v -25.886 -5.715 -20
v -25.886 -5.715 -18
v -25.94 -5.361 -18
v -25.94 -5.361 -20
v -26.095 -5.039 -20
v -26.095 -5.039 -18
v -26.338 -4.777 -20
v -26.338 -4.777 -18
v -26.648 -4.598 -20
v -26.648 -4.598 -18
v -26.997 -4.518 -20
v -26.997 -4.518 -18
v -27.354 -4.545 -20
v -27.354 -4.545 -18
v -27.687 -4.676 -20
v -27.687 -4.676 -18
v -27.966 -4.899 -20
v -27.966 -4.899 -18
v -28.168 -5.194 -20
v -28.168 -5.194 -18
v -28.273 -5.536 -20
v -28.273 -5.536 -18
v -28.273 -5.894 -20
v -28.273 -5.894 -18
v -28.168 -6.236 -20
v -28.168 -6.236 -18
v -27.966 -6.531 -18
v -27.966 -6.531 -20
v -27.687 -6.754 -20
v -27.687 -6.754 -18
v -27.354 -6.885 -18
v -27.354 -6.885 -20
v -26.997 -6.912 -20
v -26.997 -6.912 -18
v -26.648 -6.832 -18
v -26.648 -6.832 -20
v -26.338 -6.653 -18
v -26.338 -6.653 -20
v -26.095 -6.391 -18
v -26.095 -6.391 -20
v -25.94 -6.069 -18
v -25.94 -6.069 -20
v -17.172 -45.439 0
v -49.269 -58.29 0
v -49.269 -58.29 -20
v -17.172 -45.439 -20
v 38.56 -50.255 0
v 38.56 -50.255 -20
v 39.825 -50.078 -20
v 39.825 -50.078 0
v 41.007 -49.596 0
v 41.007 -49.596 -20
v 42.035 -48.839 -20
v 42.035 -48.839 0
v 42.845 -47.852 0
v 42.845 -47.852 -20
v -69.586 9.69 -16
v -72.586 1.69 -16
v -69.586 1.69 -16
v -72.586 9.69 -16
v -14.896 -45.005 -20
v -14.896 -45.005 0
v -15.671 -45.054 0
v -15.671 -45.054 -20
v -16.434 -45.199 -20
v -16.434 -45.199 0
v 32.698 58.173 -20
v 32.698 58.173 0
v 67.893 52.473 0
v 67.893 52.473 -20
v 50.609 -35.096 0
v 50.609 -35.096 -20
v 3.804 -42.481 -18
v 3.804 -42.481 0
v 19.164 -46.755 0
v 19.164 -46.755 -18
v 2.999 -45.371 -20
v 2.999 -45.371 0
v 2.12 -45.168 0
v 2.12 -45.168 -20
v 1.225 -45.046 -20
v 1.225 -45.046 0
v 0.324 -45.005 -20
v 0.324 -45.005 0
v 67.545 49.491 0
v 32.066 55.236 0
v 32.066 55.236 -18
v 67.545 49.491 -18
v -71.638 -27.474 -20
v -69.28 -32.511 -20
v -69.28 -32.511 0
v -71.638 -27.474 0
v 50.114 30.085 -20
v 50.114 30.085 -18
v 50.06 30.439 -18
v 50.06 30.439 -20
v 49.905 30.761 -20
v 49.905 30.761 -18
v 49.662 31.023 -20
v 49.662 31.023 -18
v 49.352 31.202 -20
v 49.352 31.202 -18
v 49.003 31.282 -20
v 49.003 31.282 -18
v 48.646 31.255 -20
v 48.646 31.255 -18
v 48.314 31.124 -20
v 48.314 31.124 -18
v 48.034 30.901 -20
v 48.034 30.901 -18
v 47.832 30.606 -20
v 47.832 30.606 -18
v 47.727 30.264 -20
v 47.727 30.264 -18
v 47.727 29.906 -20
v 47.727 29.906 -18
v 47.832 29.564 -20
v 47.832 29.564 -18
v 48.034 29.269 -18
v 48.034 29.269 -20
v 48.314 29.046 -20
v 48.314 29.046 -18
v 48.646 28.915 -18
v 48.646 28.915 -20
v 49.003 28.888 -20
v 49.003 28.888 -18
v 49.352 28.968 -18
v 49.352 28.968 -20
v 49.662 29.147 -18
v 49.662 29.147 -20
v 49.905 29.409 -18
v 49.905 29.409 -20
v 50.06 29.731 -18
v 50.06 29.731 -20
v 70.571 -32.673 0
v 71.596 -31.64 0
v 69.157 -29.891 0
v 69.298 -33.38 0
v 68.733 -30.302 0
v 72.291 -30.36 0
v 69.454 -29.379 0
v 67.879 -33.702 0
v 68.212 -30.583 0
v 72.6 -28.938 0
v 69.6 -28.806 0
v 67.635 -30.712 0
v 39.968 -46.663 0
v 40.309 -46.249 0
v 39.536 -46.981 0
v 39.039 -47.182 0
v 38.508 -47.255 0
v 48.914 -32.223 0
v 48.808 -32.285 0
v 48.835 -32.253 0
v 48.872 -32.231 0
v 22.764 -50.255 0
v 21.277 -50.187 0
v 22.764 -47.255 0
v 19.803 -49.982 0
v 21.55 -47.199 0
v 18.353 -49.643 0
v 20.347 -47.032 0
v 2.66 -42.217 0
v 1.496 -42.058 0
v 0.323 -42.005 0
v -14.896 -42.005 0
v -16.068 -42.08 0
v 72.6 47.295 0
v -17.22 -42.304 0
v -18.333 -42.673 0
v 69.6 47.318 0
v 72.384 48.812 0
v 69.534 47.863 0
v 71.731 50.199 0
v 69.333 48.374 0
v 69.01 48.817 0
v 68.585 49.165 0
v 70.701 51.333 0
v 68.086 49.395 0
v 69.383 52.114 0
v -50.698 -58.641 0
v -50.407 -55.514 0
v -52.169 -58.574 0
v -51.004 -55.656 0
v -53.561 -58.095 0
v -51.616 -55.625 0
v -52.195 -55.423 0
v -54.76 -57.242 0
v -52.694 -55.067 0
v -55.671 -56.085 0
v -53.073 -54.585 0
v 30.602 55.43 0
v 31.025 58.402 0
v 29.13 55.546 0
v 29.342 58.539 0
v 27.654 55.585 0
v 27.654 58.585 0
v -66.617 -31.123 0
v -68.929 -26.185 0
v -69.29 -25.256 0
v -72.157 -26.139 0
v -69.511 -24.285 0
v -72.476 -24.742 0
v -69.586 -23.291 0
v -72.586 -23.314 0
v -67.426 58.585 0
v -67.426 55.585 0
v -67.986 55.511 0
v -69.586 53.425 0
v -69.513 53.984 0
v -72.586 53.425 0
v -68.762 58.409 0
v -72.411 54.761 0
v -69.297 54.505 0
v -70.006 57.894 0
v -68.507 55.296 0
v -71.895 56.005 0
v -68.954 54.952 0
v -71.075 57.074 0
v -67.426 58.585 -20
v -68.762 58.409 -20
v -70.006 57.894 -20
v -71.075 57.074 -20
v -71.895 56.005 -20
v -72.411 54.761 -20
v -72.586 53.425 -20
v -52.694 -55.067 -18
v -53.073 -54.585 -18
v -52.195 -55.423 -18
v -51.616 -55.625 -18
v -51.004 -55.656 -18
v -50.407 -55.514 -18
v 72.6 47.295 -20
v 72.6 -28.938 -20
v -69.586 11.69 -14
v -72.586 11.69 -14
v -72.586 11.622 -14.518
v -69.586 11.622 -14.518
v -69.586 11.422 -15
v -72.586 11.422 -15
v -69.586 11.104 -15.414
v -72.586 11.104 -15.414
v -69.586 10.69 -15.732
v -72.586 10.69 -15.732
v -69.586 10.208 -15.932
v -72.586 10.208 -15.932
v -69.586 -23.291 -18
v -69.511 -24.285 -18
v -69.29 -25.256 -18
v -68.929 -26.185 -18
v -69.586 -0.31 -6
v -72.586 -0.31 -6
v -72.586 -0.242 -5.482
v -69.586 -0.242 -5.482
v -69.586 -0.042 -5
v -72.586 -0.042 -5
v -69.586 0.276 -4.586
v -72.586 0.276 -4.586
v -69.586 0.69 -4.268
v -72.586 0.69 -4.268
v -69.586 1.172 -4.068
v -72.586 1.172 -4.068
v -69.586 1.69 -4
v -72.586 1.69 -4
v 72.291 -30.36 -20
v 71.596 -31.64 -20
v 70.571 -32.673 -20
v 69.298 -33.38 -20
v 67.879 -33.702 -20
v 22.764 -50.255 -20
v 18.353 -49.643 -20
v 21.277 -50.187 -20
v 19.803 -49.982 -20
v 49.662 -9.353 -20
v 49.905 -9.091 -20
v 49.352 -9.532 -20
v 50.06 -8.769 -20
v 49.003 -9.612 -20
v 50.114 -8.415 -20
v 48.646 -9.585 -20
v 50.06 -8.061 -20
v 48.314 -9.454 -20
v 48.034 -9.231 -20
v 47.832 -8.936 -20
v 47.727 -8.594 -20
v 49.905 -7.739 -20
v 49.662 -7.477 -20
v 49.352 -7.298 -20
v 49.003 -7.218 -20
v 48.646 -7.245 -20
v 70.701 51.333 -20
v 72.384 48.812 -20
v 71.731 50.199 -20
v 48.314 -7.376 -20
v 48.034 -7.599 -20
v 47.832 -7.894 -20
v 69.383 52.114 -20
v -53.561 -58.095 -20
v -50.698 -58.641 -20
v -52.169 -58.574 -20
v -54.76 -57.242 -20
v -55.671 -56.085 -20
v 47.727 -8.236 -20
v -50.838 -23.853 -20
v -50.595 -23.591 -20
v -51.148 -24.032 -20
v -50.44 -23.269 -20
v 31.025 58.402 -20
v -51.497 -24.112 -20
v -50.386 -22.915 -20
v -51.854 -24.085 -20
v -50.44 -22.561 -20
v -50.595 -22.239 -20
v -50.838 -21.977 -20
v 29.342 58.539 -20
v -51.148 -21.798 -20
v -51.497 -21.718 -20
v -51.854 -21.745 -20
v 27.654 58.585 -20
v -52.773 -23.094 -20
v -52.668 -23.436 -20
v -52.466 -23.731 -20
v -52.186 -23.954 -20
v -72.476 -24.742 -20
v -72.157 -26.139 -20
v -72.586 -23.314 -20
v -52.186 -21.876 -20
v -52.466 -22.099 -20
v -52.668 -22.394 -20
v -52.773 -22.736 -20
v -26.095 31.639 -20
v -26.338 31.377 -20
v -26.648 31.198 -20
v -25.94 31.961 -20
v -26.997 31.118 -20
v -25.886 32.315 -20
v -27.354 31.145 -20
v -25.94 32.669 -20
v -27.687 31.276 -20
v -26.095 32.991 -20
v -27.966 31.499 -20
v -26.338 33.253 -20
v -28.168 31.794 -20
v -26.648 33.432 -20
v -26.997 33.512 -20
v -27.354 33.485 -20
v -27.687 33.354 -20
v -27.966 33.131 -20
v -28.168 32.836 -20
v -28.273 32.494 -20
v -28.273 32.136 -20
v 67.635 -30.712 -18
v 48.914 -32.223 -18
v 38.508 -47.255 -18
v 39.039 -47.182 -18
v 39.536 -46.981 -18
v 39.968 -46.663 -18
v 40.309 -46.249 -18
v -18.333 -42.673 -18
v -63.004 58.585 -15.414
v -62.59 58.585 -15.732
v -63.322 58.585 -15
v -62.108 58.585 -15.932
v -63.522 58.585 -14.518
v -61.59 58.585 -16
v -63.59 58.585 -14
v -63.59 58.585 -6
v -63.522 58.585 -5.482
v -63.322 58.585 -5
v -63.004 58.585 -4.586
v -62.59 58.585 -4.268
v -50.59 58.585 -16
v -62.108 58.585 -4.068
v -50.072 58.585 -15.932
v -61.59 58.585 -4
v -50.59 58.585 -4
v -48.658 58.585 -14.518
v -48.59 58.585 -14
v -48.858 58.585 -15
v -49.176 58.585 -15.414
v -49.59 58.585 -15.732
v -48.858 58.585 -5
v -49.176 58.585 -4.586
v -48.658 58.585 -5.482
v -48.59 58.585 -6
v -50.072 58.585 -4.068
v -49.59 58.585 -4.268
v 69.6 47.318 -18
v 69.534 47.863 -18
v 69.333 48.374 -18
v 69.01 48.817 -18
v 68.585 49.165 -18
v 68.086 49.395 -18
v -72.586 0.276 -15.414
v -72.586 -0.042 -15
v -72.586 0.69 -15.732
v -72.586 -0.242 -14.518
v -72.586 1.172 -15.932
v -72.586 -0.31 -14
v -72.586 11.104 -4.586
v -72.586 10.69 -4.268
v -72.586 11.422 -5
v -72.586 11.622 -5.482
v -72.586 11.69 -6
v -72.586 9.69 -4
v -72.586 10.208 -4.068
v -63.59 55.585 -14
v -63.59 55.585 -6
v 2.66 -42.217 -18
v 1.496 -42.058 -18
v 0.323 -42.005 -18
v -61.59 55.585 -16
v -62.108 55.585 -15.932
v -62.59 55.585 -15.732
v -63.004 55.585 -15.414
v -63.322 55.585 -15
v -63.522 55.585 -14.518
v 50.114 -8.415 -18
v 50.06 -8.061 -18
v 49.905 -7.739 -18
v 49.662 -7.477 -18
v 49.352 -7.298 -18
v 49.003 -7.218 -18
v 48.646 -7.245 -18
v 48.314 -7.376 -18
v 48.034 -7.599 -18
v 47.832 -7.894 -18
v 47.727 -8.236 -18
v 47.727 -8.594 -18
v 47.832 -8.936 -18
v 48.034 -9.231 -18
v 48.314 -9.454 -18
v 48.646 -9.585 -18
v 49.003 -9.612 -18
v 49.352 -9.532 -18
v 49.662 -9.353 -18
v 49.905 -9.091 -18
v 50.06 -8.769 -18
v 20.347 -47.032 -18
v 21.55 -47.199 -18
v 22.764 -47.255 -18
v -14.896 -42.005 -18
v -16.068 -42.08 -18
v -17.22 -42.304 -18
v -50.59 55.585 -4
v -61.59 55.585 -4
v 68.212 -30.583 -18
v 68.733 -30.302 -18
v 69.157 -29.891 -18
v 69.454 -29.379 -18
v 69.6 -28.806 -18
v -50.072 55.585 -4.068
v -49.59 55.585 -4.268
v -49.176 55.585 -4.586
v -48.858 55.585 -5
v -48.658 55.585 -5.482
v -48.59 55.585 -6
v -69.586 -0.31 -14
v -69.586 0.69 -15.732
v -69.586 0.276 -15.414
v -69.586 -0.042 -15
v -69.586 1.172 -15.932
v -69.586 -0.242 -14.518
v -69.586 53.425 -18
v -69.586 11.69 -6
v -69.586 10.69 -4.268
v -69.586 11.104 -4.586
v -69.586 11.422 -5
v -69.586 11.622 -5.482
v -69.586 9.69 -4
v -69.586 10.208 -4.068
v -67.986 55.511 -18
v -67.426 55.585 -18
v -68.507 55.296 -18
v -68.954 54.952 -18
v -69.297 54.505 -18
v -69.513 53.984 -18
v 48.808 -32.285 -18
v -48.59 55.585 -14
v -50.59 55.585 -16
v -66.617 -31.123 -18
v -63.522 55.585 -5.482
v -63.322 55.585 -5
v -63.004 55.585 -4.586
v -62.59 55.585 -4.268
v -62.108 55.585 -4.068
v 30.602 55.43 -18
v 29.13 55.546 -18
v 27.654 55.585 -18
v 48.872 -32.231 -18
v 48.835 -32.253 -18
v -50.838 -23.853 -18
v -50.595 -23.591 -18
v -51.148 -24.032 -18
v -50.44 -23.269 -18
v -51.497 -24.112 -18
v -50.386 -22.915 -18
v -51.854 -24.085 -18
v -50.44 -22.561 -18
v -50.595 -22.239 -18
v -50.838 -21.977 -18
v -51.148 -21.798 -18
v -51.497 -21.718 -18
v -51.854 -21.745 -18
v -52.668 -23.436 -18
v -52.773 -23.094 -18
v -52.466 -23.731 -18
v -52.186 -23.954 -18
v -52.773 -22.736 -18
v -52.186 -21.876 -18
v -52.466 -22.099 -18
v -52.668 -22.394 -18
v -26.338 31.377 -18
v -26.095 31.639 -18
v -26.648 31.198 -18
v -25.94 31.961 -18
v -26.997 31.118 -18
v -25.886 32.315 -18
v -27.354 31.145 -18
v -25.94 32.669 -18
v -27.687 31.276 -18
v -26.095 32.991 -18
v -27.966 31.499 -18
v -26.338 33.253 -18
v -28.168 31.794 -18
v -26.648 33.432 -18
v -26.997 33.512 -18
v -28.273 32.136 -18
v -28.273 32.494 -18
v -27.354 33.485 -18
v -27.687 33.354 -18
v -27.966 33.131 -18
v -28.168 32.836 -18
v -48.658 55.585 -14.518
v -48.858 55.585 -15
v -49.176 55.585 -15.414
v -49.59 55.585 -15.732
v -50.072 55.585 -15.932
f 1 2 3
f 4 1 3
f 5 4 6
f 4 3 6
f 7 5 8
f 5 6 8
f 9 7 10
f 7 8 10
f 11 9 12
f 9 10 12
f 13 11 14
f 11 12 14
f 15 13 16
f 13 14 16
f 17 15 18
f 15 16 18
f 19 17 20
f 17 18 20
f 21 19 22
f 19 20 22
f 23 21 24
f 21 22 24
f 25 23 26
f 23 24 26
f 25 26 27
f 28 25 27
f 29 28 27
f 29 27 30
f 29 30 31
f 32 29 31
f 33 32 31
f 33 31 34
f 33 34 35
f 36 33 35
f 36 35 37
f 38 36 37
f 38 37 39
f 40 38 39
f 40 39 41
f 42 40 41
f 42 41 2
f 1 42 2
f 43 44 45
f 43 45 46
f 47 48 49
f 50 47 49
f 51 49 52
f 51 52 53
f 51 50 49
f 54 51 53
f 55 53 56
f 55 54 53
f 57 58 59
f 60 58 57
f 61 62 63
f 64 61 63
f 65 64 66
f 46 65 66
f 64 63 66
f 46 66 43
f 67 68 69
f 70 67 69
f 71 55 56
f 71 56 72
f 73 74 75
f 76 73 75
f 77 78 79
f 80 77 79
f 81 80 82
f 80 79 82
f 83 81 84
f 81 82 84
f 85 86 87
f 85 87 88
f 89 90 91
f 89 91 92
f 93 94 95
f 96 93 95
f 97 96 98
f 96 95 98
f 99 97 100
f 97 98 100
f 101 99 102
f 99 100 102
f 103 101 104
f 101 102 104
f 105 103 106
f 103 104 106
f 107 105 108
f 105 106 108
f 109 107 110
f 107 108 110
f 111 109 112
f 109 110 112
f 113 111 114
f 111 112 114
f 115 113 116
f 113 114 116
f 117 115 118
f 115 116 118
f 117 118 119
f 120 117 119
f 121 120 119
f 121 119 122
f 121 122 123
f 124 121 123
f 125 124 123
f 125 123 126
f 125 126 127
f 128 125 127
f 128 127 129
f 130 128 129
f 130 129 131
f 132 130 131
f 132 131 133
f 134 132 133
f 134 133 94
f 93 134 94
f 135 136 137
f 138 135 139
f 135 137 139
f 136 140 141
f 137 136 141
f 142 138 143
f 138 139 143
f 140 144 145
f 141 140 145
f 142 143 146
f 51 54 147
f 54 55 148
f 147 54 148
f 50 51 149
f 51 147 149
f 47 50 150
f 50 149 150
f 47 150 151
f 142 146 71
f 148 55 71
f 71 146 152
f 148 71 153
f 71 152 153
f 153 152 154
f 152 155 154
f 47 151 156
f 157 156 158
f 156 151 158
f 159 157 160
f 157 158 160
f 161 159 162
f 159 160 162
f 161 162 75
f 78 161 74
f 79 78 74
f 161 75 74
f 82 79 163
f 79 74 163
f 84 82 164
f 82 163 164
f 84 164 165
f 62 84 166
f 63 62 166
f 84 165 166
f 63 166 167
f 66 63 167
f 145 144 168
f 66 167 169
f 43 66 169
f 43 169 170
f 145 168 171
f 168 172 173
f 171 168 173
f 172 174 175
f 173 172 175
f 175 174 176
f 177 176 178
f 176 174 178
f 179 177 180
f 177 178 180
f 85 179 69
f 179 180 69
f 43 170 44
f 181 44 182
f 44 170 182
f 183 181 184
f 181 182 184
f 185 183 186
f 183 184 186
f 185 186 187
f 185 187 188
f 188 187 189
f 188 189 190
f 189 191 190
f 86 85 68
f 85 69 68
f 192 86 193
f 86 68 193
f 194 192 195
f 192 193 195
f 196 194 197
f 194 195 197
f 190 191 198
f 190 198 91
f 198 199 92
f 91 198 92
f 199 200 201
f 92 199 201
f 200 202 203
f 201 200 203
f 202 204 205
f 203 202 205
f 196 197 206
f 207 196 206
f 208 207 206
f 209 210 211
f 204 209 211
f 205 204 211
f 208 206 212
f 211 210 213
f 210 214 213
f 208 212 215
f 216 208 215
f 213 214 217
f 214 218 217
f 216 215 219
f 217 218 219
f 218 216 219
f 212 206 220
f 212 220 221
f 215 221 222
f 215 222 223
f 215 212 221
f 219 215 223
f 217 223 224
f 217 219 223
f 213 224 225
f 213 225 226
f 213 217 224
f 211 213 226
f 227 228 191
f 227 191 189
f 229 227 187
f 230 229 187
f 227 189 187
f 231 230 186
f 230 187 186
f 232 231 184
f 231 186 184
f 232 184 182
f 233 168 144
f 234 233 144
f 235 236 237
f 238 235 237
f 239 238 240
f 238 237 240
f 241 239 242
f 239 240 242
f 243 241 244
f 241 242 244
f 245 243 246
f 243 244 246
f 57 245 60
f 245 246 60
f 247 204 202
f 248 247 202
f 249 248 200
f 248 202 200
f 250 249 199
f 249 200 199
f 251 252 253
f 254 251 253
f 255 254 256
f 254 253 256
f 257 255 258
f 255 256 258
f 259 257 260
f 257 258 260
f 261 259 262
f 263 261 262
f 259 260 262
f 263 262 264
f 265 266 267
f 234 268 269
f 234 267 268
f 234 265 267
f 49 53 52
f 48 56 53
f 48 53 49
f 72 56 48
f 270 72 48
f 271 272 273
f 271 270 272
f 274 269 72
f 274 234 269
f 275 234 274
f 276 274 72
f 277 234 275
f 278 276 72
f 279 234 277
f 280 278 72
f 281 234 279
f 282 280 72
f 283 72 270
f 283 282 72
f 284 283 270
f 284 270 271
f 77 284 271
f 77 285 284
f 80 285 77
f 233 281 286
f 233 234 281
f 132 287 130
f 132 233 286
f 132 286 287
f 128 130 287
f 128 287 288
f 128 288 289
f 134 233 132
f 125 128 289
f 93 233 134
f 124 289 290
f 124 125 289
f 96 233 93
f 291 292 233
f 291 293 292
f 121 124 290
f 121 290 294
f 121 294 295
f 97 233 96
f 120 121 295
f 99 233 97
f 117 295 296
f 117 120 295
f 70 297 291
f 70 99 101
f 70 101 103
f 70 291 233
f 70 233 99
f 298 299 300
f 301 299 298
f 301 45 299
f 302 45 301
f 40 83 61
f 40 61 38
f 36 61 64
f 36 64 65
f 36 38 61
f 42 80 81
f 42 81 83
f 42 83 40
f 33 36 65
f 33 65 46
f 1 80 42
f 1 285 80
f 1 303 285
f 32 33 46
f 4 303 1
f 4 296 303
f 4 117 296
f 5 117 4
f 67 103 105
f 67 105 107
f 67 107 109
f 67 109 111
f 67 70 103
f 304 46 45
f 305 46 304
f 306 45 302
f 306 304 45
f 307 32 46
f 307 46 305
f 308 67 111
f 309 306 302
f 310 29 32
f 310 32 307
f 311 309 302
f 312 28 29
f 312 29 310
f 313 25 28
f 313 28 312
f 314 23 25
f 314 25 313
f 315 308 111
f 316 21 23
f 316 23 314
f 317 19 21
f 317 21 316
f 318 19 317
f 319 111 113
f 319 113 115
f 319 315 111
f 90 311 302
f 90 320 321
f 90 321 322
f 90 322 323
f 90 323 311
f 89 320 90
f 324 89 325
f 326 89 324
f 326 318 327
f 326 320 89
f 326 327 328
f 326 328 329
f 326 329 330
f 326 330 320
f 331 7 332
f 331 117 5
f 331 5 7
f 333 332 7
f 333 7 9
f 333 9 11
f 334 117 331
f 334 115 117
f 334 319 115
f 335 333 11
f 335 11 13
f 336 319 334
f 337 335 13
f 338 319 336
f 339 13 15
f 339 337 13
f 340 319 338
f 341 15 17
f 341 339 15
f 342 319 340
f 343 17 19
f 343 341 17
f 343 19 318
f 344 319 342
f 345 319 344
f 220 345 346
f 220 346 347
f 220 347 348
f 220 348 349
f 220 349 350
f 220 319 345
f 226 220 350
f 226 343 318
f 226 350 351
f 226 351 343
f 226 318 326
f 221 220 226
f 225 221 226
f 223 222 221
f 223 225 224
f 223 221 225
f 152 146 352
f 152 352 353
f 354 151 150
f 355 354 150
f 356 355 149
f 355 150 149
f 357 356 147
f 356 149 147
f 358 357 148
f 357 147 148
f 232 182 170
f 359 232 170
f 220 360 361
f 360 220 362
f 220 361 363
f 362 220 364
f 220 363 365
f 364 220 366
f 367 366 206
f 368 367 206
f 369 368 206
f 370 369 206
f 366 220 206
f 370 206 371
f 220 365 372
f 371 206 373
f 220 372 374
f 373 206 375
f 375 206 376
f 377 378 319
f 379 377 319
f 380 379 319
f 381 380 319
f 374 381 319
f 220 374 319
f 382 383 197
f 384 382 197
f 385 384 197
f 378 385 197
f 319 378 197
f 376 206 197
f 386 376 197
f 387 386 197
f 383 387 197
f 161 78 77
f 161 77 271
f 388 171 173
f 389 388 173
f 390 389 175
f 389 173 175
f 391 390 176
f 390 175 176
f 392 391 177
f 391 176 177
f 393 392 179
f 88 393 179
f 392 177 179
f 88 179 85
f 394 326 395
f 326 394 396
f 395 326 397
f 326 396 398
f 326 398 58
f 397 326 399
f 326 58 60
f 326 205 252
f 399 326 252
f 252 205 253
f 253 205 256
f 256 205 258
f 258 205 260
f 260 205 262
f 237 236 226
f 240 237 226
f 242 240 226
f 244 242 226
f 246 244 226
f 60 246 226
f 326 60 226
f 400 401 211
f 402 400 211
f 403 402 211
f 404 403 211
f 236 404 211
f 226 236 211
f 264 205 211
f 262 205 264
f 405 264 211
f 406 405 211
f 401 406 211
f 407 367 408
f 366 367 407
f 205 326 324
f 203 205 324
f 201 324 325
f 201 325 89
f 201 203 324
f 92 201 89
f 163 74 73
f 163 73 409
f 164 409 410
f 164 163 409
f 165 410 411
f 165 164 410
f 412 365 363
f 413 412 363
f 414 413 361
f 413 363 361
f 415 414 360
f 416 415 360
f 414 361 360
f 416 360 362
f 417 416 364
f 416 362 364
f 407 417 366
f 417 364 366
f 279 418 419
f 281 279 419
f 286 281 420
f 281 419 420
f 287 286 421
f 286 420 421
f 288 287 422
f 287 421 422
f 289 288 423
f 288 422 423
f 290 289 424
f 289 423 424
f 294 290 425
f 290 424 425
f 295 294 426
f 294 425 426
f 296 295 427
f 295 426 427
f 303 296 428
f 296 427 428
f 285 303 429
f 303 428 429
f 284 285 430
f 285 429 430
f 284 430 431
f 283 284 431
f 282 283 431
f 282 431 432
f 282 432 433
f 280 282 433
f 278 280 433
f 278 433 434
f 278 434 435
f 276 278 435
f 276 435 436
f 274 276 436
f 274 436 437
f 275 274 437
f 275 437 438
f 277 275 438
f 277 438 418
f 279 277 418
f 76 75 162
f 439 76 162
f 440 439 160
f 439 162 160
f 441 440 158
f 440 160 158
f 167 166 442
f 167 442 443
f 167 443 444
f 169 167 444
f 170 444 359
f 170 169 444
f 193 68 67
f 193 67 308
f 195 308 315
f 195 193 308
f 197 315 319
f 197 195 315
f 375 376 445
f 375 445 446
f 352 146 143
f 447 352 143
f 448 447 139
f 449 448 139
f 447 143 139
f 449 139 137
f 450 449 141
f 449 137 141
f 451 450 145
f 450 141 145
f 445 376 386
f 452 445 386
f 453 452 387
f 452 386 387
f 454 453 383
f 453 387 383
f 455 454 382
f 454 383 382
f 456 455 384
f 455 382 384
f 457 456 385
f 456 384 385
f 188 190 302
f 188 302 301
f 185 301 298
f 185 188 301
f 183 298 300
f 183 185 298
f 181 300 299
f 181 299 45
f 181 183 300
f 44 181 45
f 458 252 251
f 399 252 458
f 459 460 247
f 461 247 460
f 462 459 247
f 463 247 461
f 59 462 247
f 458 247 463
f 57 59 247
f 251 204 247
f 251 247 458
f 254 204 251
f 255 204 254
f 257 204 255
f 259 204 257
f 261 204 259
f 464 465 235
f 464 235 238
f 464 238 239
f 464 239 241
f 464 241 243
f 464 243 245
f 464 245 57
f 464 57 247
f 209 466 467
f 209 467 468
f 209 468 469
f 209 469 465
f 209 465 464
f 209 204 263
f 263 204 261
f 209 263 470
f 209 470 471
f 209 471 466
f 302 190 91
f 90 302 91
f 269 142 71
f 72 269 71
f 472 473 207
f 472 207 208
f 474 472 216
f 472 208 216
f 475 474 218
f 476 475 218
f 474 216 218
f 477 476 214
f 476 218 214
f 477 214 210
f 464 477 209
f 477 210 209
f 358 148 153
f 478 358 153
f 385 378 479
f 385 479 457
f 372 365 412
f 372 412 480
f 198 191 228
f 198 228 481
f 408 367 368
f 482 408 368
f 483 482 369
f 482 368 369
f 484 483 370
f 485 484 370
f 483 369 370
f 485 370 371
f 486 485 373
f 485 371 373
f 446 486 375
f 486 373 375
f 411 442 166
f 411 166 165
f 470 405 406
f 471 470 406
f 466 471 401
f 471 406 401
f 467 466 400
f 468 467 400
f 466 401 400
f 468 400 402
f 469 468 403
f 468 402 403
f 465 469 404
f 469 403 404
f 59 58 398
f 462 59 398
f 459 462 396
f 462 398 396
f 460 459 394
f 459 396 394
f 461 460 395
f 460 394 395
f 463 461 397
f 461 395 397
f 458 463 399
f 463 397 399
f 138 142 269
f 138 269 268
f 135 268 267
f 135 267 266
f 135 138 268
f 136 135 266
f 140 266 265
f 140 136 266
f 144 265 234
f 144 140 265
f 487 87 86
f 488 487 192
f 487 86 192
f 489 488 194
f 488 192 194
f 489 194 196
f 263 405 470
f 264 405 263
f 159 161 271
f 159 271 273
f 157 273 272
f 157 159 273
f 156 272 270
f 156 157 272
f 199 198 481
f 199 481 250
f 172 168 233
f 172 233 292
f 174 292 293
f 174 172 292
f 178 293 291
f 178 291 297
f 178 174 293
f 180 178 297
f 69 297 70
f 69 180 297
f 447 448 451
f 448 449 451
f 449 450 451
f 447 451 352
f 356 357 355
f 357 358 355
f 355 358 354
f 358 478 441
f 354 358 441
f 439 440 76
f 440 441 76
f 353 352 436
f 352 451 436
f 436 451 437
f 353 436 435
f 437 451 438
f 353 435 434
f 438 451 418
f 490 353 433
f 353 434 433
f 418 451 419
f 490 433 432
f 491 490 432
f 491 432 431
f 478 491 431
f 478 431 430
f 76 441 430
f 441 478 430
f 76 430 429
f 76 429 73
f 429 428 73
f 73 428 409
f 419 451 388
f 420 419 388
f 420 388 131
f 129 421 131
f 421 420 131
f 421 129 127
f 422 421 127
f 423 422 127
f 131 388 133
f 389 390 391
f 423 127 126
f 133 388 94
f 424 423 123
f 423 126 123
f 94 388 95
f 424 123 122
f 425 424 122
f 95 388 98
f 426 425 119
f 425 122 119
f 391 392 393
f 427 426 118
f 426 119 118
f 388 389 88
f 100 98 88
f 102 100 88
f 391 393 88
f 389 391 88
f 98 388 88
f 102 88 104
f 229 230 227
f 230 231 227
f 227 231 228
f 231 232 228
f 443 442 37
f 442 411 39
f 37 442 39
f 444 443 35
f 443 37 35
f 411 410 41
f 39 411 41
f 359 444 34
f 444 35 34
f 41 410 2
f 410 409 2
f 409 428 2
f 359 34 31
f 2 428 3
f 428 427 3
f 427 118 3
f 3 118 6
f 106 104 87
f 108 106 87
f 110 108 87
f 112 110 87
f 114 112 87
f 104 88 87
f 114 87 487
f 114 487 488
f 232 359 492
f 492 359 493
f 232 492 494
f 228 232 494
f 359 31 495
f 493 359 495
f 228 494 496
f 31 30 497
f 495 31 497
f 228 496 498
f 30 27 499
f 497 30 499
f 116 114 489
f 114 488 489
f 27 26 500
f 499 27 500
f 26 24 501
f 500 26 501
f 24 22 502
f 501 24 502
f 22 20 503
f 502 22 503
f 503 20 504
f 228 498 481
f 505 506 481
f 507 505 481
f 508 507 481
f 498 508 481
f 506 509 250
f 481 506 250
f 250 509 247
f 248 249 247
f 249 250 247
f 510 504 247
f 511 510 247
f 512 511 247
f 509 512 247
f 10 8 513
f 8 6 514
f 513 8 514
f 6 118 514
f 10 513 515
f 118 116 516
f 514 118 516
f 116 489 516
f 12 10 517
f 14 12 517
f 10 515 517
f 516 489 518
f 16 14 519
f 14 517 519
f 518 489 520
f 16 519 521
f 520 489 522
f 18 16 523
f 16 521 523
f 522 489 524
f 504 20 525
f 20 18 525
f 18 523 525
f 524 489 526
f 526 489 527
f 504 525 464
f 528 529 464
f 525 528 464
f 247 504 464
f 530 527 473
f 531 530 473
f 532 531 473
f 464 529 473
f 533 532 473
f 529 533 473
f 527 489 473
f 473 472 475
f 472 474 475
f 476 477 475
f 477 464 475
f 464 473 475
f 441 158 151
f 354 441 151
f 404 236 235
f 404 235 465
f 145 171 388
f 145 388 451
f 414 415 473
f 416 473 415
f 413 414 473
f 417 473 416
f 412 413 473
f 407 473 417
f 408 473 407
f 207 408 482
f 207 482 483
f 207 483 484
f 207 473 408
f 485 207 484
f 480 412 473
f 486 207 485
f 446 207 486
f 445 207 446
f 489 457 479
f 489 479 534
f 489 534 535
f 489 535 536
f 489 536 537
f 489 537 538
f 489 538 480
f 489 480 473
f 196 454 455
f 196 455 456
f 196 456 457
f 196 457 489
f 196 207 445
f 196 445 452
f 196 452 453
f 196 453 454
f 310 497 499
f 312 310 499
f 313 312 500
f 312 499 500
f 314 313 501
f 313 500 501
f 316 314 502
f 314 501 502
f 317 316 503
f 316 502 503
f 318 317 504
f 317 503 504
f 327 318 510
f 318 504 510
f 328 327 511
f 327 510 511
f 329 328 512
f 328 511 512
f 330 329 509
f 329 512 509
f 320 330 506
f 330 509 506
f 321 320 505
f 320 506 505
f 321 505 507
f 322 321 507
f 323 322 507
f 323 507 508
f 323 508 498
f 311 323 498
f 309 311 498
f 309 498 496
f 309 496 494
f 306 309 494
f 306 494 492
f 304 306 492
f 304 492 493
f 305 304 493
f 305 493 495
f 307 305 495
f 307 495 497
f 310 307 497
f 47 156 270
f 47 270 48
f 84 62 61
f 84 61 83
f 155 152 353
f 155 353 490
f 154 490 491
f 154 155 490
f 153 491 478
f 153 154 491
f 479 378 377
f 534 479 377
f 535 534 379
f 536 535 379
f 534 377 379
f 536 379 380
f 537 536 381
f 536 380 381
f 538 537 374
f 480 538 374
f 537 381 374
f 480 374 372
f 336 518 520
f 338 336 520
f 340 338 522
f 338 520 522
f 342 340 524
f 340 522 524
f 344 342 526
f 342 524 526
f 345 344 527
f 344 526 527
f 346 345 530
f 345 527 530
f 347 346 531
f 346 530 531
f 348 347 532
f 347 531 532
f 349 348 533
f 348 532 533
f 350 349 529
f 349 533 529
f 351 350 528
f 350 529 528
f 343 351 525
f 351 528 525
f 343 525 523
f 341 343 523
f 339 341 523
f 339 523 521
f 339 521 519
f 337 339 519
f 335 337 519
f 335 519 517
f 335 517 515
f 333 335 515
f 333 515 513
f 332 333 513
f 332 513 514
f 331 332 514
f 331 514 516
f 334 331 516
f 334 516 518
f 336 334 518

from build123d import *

# Parameters (mm, degrees)
PAD_DEPTH       = 20
POCKET_DEPTH    = 18
SKETCH005_R     = 1.2
POCKET003_DEPTH = 20.001
POCKET004_DEPTH = 5
POCKET005_DEPTH = 5


with BuildPart() as part:
    # Sketch001 → Pad (new body)
    with BuildSketch(Plane.XY):
        with BuildLine():
            Line((-67.426499, 58.585), (27.6535, 58.585))
            ThreePointArc((32.698116, 58.172721), (30.184217, 58.481759), (27.6535, 58.585))
            Line((32.698116, 58.172721), (67.893206, 52.473431))
            ThreePointArc((72.6, 47.295321), (71.258477, 50.804149), (67.893206, 52.473431))
            Line((72.6, 47.295321), (72.6, -28.937809))
            ThreePointArc((67.878753, -33.701756), (71.12035, -32.19286), (72.6, -28.937809))
            Line((67.878753, -33.701756), (50.609101, -35.095512))
            Line((42.845448, -47.852044), (50.609101, -35.095512))
            ThreePointArc((38.559931, -50.255), (41.007059, -49.596346), (42.845448, -47.852044))
            Line((22.7635, -50.255), (38.559931, -50.255))
            ThreePointArc((18.35348, -49.643055), (20.537362, -50.101284), (22.7635, -50.255))
            Line((2.999306, -45.370847), (18.35348, -49.643055))
            ThreePointArc((2.999306, -45.370847), (1.67385, -45.096885), (0.3235, -45.005))
            Line((-14.8965, -45.005), (0.3235, -45.005))
            ThreePointArc((-14.8965, -45.005), (-16.054737, -45.11454), (-17.171903, -45.439275))
            Line((-49.26854, -58.28994), (-17.171903, -45.439275))
            ThreePointArc((-55.670661, -56.084897), (-52.881781, -58.384143), (-49.26854, -58.28994))
            Line((-55.670661, -56.084897), (-69.279896, -32.511389))
            Line((-69.279896, -32.511389), (-71.638452, -27.473846))
            ThreePointArc((-72.5865, -23.314273), (-72.342256, -25.446431), (-71.638452, -27.473846))
            Line((-72.5865, -23.314273), (-72.5865, 53.425))
            ThreePointArc((-67.426499, 58.585), (-71.075171, 57.073671), (-72.5865, 53.425))
        make_face()
    extrude(amount=-PAD_DEPTH)

    # Sketch002 → Pocket (cut)
    with BuildSketch(Plane.XY):
        with BuildLine():
            Line((-67.4265, 55.585), (27.6535, 55.585))
            ThreePointArc((32.06601, 55.236001), (29.866645, 55.497614), (27.6535, 55.585))
            Line((32.06601, 55.236001), (67.545103, 49.490722))
            ThreePointArc((69.6, 47.317506), (69.009594, 48.817361), (67.545103, 49.490722))
            Line((69.6, 47.317506), (69.6, -28.805775))
            ThreePointArc((67.634813, -30.711689), (68.959166, -30.11112), (69.6, -28.805775))
            Line((67.634813, -30.711689), (48.91361, -32.222593))
            ThreePointArc((48.91361, -32.222593), (48.852847, -32.240442), (48.807734, -32.284889))
            Line((40.308987, -46.249261), (48.807734, -32.284889))
            ThreePointArc((38.508222, -47.255), (39.536447, -46.98103), (40.308987, -46.249261))
            Line((22.7635, -47.255), (38.508222, -47.255))
            ThreePointArc((19.164322, -46.754702), (20.946609, -47.129327), (22.7635, -47.255))
            Line((3.804006, -42.480786), (19.164322, -46.754702))
            ThreePointArc((3.804006, -42.480786), (2.079938, -42.124497), (0.3235, -42.005))
            Line((-14.8965, -42.005), (0.3235, -42.005))
            ThreePointArc((-14.8965, -42.005), (-16.647117, -42.1735), (-18.333455, -42.672814))
            Line((-50.407295, -55.514352), (-18.333455, -42.672814))
            ThreePointArc((-53.07254, -54.584974), (-51.912632, -55.544969), (-50.407295, -55.514352))
            Line((-53.07254, -54.584974), (-66.617474, -31.122847))
            Line((-66.617474, -31.122847), (-68.929488, -26.184711))
            ThreePointArc((-69.5865, -23.291347), (-69.418415, -24.774457), (-68.929488, -26.184711))
            Line((-69.5865, -23.291347), (-69.5865, 53.425))
            ThreePointArc((-67.4265, 55.585), (-68.953851, 54.952351), (-69.5865, 53.425))
        make_face()
    extrude(amount=-POCKET_DEPTH, mode=Mode.SUBTRACT)

    # Sketch005 → Pocket003 (cut, through all)
    with BuildSketch(Plane.XY):
        with Locations((-27.0865, 32.315)):
            Circle(SKETCH005_R)
        with Locations((48.9135, -8.415)):
            Circle(SKETCH005_R)
        with Locations((48.9135, 30.085)):
            Circle(SKETCH005_R)
        with Locations((-27.0865, -5.715)):
            Circle(SKETCH005_R)
        with Locations((-51.5865, -22.915)):
            Circle(SKETCH005_R)
    extrude(amount=-POCKET003_DEPTH, mode=Mode.SUBTRACT)

    # Sketch003 (on Face7 of Pocket) → Pocket004 (cut)
    with BuildSketch(Plane(origin=(0, 58.585, 0), x_dir=(-1, 0, 0), z_dir=(0, 1, 0))):
        with BuildLine():
            Line((50.59, -4), (61.59, -4))
            ThreePointArc((63.59, -6), (63.004214, -4.585786), (61.59, -4))
            Line((63.59, -6), (63.59, -14))
            ThreePointArc((61.59, -16), (63.004214, -15.414214), (63.59, -14))
            Line((61.59, -16), (50.59, -16))
            ThreePointArc((48.59, -14), (49.175786, -15.414214), (50.59, -16))
            Line((48.59, -14), (48.59, -6))
            ThreePointArc((50.59, -4), (49.175786, -4.585786), (48.59, -6))
        make_face()
    extrude(amount=-POCKET004_DEPTH, mode=Mode.SUBTRACT)

    # Sketch004 (on Face1 of Pocket004) → Pocket005 (cut)
    with BuildSketch(Plane(origin=(-72.5865, 0, 0), x_dir=(0, -1, 0), z_dir=(-1, 0, 0))):
        with BuildLine():
            Line((-9.69, -4), (-1.69, -4))
            ThreePointArc((0.31, -6), (-0.275786, -4.585786), (-1.69, -4))
            Line((0.31, -6), (0.31, -14))
            ThreePointArc((-1.69, -16), (-0.275786, -15.414214), (0.31, -14))
            Line((-1.69, -16), (-9.69, -16))
            ThreePointArc((-11.69, -14), (-11.104214, -15.414214), (-9.69, -16))
            Line((-11.69, -14), (-11.69, -6))
            ThreePointArc((-9.69, -4), (-11.104214, -4.585786), (-11.69, -6))
        make_face()
    extrude(amount=-POCKET005_DEPTH, mode=Mode.SUBTRACT)


solid = part.part
